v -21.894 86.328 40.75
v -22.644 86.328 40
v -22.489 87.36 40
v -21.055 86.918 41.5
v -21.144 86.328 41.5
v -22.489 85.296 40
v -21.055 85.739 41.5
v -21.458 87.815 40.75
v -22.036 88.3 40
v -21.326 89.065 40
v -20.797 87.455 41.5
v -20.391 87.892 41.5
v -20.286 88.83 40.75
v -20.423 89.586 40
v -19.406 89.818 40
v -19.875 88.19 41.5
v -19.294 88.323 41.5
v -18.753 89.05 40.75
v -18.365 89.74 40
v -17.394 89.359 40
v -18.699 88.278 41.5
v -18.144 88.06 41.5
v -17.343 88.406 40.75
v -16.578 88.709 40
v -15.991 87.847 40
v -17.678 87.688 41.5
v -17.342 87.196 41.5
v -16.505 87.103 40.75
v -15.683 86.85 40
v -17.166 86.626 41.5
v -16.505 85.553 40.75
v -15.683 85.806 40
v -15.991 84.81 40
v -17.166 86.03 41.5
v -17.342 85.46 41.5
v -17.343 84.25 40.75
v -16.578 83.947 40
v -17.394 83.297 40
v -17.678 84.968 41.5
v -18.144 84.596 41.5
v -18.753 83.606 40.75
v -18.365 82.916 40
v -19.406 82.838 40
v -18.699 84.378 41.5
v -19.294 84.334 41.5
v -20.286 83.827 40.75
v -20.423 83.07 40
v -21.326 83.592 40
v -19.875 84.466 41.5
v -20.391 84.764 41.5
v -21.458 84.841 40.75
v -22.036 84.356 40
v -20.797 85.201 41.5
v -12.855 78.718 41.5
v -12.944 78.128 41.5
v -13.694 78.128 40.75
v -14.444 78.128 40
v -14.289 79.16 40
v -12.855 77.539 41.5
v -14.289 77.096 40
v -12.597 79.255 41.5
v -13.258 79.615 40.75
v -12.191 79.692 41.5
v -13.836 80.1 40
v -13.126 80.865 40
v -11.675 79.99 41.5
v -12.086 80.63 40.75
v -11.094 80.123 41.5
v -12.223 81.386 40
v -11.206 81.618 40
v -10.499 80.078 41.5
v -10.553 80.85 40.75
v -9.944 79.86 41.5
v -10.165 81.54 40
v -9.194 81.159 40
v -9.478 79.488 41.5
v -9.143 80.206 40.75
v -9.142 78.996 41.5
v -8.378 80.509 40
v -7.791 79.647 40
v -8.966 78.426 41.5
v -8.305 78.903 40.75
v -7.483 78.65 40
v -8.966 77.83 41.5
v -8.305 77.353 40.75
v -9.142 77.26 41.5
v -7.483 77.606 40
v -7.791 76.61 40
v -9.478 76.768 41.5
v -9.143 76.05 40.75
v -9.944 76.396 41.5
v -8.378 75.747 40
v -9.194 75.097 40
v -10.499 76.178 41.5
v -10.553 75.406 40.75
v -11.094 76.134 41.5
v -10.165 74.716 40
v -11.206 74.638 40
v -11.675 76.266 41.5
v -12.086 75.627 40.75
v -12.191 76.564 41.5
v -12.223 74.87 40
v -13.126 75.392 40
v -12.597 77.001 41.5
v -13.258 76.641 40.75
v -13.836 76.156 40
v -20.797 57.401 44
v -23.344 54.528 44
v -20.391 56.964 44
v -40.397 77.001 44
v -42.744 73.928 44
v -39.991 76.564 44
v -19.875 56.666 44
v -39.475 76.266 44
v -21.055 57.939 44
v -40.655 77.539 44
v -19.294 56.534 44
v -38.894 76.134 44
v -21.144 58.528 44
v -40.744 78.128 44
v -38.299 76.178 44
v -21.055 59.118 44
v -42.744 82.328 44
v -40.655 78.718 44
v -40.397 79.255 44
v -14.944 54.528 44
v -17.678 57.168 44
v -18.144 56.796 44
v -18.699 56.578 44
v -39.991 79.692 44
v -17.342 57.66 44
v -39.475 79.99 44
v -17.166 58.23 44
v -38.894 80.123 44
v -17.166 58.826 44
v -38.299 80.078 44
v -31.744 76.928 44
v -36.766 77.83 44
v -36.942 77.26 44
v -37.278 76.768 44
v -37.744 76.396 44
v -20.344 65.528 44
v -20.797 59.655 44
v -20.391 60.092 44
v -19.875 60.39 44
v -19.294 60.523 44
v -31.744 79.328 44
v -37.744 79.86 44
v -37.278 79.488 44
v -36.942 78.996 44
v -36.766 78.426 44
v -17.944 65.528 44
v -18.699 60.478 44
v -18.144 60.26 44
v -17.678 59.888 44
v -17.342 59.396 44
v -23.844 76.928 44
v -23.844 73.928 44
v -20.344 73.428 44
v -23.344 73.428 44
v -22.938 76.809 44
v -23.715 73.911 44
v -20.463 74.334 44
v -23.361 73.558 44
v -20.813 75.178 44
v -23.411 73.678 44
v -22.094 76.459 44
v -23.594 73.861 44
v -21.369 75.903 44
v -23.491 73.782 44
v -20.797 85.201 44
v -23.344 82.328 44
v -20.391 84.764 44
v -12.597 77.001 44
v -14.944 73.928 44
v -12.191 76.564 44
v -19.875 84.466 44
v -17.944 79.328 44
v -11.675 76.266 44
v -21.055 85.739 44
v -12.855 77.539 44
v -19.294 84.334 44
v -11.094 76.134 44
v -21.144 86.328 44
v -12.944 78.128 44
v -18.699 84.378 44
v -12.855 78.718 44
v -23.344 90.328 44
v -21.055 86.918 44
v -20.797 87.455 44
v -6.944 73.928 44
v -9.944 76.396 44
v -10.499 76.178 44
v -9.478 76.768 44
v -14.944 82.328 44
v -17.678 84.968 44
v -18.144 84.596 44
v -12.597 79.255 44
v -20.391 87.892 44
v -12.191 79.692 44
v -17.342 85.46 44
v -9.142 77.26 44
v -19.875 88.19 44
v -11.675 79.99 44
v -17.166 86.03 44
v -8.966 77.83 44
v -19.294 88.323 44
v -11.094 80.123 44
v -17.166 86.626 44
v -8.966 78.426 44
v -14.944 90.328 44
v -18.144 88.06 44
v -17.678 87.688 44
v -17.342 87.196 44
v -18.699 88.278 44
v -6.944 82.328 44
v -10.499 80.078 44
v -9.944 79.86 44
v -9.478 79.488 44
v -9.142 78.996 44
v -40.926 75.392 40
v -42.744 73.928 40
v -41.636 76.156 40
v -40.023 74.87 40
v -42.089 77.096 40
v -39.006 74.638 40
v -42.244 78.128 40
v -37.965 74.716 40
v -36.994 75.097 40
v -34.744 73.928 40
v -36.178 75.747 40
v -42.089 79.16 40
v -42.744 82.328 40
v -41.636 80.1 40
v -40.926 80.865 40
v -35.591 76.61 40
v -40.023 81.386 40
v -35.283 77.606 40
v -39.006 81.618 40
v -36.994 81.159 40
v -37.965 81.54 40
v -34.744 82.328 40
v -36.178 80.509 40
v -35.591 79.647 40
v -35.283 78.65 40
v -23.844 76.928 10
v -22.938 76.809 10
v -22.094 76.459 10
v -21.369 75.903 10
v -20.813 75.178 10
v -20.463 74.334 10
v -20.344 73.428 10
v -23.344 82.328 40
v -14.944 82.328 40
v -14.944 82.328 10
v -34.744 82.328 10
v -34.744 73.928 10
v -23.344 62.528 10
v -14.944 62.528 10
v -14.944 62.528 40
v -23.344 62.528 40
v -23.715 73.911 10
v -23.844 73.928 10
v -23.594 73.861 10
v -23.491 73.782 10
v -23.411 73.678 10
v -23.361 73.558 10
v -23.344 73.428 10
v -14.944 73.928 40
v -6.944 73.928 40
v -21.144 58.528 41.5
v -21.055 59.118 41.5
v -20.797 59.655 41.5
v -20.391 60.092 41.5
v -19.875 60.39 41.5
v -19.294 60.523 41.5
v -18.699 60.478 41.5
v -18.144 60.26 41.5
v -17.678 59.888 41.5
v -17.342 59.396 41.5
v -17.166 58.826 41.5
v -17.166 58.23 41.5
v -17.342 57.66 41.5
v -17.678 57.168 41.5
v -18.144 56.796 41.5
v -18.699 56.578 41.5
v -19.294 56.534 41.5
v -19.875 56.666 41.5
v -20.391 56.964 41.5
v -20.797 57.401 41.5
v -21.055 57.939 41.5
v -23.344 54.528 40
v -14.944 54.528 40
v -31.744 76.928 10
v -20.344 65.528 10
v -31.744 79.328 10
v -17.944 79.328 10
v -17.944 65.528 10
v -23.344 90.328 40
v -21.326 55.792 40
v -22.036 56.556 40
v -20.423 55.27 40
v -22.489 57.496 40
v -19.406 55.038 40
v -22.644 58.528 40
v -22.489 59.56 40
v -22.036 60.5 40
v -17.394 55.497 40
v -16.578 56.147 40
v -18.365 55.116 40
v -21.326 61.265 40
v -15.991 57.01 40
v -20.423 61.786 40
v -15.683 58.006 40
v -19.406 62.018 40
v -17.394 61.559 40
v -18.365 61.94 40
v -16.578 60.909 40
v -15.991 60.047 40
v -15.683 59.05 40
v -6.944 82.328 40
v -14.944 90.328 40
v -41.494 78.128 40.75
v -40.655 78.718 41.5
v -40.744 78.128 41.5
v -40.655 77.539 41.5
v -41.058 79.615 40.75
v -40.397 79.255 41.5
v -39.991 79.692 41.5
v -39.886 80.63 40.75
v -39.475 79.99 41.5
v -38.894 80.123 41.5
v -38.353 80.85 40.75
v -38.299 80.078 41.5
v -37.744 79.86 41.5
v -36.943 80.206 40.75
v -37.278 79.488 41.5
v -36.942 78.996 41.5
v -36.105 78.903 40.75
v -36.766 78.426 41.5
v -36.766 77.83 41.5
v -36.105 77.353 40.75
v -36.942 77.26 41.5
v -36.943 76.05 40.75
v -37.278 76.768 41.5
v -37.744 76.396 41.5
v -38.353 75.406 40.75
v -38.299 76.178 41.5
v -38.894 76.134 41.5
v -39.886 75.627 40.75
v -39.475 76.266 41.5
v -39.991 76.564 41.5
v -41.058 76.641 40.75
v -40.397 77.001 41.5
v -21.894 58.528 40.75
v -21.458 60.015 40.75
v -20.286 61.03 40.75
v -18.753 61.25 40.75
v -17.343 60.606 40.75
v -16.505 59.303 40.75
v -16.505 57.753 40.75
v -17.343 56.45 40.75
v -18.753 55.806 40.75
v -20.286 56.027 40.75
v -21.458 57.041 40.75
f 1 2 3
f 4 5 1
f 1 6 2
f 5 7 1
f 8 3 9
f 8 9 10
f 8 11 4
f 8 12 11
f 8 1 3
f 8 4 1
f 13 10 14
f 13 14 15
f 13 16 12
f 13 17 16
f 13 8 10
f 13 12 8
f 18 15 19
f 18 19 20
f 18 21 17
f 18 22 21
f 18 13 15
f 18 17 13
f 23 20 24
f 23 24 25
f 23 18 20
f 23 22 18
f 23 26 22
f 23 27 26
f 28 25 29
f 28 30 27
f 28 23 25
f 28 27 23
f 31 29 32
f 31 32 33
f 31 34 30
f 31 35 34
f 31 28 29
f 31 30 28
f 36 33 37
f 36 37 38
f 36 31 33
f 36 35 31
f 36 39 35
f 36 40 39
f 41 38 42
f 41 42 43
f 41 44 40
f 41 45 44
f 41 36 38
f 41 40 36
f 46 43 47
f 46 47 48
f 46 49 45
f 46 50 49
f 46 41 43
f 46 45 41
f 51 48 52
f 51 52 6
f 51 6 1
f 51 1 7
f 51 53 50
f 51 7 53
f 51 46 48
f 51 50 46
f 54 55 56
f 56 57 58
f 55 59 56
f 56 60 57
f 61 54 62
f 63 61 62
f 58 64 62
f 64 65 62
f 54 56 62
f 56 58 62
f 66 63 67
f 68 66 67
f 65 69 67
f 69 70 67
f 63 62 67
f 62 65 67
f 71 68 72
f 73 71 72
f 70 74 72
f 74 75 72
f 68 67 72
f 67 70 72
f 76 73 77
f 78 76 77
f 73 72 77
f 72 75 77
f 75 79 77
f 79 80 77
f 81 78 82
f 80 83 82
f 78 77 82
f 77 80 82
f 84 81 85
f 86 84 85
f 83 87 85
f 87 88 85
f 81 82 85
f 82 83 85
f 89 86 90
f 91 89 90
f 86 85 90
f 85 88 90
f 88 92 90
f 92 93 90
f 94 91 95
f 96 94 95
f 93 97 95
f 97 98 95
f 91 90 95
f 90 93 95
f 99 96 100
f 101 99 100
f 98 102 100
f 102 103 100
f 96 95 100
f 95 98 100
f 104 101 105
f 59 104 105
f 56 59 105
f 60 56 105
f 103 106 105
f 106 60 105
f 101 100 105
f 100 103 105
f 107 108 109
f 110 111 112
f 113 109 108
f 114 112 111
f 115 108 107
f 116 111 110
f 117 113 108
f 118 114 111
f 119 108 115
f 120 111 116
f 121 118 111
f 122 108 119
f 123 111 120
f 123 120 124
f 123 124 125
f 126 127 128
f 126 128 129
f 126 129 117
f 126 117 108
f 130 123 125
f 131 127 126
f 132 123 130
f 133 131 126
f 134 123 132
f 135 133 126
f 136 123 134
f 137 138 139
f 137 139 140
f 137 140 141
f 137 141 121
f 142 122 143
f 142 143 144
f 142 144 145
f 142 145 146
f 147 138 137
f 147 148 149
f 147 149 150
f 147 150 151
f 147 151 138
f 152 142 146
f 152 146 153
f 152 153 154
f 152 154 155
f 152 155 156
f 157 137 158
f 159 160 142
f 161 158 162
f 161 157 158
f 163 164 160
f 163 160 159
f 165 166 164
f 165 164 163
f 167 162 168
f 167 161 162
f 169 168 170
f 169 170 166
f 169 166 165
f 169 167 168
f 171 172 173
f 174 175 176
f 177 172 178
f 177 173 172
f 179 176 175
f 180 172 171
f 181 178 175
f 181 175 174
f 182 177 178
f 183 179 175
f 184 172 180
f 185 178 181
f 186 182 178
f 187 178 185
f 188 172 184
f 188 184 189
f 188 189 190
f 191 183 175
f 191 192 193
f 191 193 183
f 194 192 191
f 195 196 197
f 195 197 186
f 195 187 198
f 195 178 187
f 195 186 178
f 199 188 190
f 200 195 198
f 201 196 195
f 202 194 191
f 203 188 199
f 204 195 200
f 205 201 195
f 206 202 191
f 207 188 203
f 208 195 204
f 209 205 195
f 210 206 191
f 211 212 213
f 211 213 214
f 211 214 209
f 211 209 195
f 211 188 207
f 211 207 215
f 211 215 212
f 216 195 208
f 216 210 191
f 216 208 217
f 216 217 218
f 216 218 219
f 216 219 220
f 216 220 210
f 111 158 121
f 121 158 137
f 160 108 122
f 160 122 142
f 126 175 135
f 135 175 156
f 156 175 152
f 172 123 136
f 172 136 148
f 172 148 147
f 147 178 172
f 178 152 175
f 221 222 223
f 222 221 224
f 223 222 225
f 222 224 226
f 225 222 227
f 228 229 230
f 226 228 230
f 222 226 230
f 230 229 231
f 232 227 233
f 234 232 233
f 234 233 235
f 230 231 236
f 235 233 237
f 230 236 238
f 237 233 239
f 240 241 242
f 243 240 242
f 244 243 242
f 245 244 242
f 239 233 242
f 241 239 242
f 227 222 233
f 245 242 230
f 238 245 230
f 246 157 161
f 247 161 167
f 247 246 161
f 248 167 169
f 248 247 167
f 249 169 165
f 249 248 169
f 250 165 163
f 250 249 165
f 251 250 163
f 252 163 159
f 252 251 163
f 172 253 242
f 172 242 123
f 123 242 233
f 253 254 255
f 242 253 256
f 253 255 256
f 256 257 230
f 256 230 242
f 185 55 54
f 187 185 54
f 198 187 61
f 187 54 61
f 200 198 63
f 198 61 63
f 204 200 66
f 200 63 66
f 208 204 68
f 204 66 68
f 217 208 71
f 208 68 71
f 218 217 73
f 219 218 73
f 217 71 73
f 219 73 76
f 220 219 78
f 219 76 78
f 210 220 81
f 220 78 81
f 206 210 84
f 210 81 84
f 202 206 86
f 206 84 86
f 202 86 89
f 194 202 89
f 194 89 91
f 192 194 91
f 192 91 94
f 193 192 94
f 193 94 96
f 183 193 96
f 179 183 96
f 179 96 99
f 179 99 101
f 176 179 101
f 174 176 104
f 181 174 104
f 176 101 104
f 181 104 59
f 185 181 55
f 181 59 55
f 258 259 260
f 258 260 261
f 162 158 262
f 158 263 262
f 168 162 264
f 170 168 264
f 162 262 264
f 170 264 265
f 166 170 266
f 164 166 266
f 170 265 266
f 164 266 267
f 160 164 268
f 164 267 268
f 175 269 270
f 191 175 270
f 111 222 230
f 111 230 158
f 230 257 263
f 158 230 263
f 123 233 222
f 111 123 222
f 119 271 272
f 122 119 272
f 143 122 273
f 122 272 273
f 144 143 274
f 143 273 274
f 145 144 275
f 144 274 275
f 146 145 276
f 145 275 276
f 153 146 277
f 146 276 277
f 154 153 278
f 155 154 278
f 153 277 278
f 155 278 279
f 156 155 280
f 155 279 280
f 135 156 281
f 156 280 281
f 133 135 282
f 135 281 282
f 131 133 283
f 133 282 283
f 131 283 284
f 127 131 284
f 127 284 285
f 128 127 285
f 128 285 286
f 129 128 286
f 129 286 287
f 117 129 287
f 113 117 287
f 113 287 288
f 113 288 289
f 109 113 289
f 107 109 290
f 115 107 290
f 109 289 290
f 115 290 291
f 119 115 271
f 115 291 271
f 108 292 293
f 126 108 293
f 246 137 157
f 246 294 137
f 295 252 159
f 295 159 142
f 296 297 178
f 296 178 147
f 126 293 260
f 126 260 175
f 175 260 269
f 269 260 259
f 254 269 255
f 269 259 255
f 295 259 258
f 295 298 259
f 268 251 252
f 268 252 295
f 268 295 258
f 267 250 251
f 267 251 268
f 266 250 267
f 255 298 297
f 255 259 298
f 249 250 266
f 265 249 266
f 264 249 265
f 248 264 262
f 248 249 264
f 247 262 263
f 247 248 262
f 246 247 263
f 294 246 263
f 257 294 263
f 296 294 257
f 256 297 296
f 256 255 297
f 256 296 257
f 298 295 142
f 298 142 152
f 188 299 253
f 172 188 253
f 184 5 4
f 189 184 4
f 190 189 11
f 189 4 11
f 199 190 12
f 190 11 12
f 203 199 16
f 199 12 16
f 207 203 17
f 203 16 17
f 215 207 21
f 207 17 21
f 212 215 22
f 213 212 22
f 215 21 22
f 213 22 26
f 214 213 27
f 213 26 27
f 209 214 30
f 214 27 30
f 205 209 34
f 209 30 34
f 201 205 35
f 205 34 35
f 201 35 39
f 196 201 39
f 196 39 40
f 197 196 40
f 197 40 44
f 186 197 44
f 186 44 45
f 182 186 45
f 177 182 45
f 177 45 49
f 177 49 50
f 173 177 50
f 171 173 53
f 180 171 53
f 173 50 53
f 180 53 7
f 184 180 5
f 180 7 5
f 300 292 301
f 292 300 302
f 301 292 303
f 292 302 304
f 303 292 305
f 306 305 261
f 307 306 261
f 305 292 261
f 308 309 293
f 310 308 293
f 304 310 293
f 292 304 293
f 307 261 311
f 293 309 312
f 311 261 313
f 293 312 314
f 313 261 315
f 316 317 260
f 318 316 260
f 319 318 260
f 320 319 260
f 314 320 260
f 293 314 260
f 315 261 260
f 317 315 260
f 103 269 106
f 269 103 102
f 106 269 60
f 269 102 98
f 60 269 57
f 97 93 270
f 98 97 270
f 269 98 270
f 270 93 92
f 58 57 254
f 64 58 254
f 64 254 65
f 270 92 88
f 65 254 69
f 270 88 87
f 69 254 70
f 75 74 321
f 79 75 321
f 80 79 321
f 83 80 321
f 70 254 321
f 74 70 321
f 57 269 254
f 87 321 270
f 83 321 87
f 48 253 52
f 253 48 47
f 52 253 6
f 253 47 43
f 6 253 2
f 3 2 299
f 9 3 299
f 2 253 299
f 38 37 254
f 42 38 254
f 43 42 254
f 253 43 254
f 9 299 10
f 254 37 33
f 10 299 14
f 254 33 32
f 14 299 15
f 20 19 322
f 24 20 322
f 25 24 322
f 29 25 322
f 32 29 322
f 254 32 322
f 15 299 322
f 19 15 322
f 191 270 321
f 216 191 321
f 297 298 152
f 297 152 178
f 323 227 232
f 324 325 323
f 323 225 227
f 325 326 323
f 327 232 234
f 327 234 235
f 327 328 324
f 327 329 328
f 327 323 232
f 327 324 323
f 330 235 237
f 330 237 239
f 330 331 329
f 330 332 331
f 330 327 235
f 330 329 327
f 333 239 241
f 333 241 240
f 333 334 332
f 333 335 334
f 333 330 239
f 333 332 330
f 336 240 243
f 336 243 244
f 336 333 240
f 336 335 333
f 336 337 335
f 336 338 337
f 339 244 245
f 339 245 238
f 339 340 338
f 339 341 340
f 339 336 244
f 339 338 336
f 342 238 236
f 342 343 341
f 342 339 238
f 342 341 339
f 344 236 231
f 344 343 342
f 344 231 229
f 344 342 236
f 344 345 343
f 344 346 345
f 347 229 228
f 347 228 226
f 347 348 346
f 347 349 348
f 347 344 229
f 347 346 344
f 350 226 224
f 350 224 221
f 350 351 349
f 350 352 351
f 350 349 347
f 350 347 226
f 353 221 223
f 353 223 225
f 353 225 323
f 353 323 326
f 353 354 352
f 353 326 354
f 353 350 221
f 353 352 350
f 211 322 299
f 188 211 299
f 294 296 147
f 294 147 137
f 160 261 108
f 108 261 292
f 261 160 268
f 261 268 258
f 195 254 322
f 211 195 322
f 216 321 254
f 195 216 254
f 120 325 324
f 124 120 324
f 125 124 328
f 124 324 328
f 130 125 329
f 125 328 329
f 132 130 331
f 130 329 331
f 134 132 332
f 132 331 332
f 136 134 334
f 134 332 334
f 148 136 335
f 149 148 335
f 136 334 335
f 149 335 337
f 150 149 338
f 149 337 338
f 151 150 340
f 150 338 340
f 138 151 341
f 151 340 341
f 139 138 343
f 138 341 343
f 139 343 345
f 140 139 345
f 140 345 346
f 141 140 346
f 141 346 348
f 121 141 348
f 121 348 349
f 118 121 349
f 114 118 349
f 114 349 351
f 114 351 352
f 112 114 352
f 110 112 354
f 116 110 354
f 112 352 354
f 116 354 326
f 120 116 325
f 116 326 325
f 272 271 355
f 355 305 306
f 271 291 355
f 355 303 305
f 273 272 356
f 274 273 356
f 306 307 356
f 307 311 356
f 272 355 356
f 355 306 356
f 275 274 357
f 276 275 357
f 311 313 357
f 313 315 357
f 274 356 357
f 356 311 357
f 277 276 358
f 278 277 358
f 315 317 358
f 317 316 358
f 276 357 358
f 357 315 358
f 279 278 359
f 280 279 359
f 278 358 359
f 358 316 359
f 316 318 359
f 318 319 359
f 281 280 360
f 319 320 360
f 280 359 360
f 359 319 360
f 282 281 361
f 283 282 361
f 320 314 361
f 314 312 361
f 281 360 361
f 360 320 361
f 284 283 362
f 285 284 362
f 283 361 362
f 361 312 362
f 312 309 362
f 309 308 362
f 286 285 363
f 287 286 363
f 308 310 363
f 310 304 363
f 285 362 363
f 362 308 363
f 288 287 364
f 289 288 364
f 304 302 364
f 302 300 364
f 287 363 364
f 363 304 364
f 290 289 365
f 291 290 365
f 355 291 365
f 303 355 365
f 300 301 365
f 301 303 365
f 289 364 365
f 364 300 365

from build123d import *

# Parameters (mm, degrees)
BOSS_EXTRUDE1_DEPTH = 30
BOSS_EXTRUDE2_DEPTH = 4
SKETCH4_R           = 2
CUT_EXTRUDE1_DEPTH  = 4
CHAMFER1_SIZE       = 1.5


with BuildPart() as part:
    # Sketch2 → Boss-Extrude1 (new body)
    with BuildSketch(Plane.XY.offset(10)):
        with BuildLine():
            Line((-14.944066591, 82.328103542), (-14.944066591, 62.528103542))
            Line((-14.944066591, 62.528103542), (-23.344066591, 62.528103542))
            Line((-23.344066591, 62.528103542), (-23.344066591, 73.428103542))
            ThreePointArc((-23.344066591, 73.428103542), (-23.490513201, 73.781656932), (-23.844066591, 73.928103542))
            Line((-23.844066591, 73.928103542), (-34.744066591, 73.928103542))
            Line((-34.744066591, 73.928103542), (-34.744066591, 82.328103542))
            Line((-34.744066591, 82.328103542), (-14.944066591, 82.328103542))
        make_face()
        with BuildLine():
            Line((-17.944066591, 79.328103542), (-17.944066591, 65.528103542))
            Line((-17.944066591, 65.528103542), (-20.344066591, 65.528103542))
            Line((-20.344066591, 65.528103542), (-20.344066591, 73.428103542))
            ThreePointArc((-20.344066591, 73.428103542), (-21.369192857, 75.902977276), (-23.844066591, 76.928103542))
            Line((-23.844066591, 76.928103542), (-31.744066591, 76.928103542))
            Line((-31.744066591, 76.928103542), (-31.744066591, 79.328103542))
            Line((-31.744066591, 79.328103542), (-17.944066591, 79.328103542))
        make_face(mode=Mode.SUBTRACT)
    extrude(amount=BOSS_EXTRUDE1_DEPTH)

    # Sketch3 → Boss-Extrude2 (add)
    with BuildSketch(Plane.XY.offset(40)):
        with BuildLine():
            Line((-34.744066591, 82.328103542), (-42.744066591, 82.328103542))
            Line((-42.744066591, 82.328103542), (-42.744066591, 73.928103542))
            Line((-42.744066591, 73.928103542), (-34.744066591, 73.928103542))
            Line((-34.744066591, 73.928103542), (-23.844066591, 73.928103542))
            ThreePointArc((-23.844066591, 73.928103542), (-23.490513201, 73.781656932), (-23.344066591, 73.428103542))
            Line((-23.344066591, 73.428103542), (-23.344066591, 62.528103542))
            Line((-23.344066591, 62.528103542), (-23.344066591, 54.528103542))
            Line((-23.344066591, 54.528103542), (-14.944066591, 54.528103542))
            Line((-14.944066591, 54.528103542), (-14.944066591, 62.528103542))
            Line((-14.944066591, 62.528103542), (-14.944066591, 73.928103542))
            Line((-14.944066591, 73.928103542), (-6.944066591, 73.928103542))
            Line((-6.944066591, 73.928103542), (-6.944066591, 82.328103542))
            Line((-6.944066591, 82.328103542), (-14.944066591, 82.328103542))
            Line((-14.944066591, 82.328103542), (-14.944066591, 90.328103542))
            Line((-14.944066591, 90.328103542), (-23.344066591, 90.328103542))
            Line((-23.344066591, 90.328103542), (-23.344066591, 82.328103542))
            Line((-23.344066591, 82.328103542), (-34.744066591, 82.328103542))
        make_face()
        with BuildLine():
            Line((-31.744066591, 76.928103542), (-23.844066591, 76.928103542))
            ThreePointArc((-23.844066591, 76.928103542), (-21.369192857, 75.902977276), (-20.344066591, 73.428103542))
            Line((-20.344066591, 73.428103542), (-20.344066591, 65.528103542))
            Line((-20.344066591, 65.528103542), (-17.944066591, 65.528103542))
            Line((-17.944066591, 65.528103542), (-17.944066591, 79.328103542))
            Line((-17.944066591, 79.328103542), (-31.744066591, 79.328103542))
            Line((-31.744066591, 79.328103542), (-31.744066591, 76.928103542))
        make_face(mode=Mode.SUBTRACT)
    extrude(amount=BOSS_EXTRUDE2_DEPTH)

    # Sketch4 → Cut-Extrude1 (cut)
    with BuildSketch(Plane(origin=(0, 0, 40), x_dir=(-1, 0, 0), z_dir=(0, 0, -1))):
        with Locations((19.144066591, 86.328103542)):
            Circle(SKETCH4_R)
        with Locations((10.944066591, 78.128103542)):
            Circle(SKETCH4_R)
        with Locations((38.744066591, 78.128103542)):
            Circle(SKETCH4_R)
        with Locations((19.144066591, 58.528103542)):
            Circle(SKETCH4_R)
    extrude(amount=-CUT_EXTRUDE1_DEPTH, mode=Mode.SUBTRACT)

    # Chamfer1
    chamfer1_edges = [part.edges().sort_by_distance(p)[0] for p in [
        (-17.144066591, 86.328103542, 40),
        (-8.944066591, 78.128103542, 40),
        (-36.744066591, 78.128103542, 40),
        (-17.144066591, 58.528103542, 40),
    ]]
    chamfer(chamfer1_edges, length=CHAMFER1_SIZE)


solid = part.part
